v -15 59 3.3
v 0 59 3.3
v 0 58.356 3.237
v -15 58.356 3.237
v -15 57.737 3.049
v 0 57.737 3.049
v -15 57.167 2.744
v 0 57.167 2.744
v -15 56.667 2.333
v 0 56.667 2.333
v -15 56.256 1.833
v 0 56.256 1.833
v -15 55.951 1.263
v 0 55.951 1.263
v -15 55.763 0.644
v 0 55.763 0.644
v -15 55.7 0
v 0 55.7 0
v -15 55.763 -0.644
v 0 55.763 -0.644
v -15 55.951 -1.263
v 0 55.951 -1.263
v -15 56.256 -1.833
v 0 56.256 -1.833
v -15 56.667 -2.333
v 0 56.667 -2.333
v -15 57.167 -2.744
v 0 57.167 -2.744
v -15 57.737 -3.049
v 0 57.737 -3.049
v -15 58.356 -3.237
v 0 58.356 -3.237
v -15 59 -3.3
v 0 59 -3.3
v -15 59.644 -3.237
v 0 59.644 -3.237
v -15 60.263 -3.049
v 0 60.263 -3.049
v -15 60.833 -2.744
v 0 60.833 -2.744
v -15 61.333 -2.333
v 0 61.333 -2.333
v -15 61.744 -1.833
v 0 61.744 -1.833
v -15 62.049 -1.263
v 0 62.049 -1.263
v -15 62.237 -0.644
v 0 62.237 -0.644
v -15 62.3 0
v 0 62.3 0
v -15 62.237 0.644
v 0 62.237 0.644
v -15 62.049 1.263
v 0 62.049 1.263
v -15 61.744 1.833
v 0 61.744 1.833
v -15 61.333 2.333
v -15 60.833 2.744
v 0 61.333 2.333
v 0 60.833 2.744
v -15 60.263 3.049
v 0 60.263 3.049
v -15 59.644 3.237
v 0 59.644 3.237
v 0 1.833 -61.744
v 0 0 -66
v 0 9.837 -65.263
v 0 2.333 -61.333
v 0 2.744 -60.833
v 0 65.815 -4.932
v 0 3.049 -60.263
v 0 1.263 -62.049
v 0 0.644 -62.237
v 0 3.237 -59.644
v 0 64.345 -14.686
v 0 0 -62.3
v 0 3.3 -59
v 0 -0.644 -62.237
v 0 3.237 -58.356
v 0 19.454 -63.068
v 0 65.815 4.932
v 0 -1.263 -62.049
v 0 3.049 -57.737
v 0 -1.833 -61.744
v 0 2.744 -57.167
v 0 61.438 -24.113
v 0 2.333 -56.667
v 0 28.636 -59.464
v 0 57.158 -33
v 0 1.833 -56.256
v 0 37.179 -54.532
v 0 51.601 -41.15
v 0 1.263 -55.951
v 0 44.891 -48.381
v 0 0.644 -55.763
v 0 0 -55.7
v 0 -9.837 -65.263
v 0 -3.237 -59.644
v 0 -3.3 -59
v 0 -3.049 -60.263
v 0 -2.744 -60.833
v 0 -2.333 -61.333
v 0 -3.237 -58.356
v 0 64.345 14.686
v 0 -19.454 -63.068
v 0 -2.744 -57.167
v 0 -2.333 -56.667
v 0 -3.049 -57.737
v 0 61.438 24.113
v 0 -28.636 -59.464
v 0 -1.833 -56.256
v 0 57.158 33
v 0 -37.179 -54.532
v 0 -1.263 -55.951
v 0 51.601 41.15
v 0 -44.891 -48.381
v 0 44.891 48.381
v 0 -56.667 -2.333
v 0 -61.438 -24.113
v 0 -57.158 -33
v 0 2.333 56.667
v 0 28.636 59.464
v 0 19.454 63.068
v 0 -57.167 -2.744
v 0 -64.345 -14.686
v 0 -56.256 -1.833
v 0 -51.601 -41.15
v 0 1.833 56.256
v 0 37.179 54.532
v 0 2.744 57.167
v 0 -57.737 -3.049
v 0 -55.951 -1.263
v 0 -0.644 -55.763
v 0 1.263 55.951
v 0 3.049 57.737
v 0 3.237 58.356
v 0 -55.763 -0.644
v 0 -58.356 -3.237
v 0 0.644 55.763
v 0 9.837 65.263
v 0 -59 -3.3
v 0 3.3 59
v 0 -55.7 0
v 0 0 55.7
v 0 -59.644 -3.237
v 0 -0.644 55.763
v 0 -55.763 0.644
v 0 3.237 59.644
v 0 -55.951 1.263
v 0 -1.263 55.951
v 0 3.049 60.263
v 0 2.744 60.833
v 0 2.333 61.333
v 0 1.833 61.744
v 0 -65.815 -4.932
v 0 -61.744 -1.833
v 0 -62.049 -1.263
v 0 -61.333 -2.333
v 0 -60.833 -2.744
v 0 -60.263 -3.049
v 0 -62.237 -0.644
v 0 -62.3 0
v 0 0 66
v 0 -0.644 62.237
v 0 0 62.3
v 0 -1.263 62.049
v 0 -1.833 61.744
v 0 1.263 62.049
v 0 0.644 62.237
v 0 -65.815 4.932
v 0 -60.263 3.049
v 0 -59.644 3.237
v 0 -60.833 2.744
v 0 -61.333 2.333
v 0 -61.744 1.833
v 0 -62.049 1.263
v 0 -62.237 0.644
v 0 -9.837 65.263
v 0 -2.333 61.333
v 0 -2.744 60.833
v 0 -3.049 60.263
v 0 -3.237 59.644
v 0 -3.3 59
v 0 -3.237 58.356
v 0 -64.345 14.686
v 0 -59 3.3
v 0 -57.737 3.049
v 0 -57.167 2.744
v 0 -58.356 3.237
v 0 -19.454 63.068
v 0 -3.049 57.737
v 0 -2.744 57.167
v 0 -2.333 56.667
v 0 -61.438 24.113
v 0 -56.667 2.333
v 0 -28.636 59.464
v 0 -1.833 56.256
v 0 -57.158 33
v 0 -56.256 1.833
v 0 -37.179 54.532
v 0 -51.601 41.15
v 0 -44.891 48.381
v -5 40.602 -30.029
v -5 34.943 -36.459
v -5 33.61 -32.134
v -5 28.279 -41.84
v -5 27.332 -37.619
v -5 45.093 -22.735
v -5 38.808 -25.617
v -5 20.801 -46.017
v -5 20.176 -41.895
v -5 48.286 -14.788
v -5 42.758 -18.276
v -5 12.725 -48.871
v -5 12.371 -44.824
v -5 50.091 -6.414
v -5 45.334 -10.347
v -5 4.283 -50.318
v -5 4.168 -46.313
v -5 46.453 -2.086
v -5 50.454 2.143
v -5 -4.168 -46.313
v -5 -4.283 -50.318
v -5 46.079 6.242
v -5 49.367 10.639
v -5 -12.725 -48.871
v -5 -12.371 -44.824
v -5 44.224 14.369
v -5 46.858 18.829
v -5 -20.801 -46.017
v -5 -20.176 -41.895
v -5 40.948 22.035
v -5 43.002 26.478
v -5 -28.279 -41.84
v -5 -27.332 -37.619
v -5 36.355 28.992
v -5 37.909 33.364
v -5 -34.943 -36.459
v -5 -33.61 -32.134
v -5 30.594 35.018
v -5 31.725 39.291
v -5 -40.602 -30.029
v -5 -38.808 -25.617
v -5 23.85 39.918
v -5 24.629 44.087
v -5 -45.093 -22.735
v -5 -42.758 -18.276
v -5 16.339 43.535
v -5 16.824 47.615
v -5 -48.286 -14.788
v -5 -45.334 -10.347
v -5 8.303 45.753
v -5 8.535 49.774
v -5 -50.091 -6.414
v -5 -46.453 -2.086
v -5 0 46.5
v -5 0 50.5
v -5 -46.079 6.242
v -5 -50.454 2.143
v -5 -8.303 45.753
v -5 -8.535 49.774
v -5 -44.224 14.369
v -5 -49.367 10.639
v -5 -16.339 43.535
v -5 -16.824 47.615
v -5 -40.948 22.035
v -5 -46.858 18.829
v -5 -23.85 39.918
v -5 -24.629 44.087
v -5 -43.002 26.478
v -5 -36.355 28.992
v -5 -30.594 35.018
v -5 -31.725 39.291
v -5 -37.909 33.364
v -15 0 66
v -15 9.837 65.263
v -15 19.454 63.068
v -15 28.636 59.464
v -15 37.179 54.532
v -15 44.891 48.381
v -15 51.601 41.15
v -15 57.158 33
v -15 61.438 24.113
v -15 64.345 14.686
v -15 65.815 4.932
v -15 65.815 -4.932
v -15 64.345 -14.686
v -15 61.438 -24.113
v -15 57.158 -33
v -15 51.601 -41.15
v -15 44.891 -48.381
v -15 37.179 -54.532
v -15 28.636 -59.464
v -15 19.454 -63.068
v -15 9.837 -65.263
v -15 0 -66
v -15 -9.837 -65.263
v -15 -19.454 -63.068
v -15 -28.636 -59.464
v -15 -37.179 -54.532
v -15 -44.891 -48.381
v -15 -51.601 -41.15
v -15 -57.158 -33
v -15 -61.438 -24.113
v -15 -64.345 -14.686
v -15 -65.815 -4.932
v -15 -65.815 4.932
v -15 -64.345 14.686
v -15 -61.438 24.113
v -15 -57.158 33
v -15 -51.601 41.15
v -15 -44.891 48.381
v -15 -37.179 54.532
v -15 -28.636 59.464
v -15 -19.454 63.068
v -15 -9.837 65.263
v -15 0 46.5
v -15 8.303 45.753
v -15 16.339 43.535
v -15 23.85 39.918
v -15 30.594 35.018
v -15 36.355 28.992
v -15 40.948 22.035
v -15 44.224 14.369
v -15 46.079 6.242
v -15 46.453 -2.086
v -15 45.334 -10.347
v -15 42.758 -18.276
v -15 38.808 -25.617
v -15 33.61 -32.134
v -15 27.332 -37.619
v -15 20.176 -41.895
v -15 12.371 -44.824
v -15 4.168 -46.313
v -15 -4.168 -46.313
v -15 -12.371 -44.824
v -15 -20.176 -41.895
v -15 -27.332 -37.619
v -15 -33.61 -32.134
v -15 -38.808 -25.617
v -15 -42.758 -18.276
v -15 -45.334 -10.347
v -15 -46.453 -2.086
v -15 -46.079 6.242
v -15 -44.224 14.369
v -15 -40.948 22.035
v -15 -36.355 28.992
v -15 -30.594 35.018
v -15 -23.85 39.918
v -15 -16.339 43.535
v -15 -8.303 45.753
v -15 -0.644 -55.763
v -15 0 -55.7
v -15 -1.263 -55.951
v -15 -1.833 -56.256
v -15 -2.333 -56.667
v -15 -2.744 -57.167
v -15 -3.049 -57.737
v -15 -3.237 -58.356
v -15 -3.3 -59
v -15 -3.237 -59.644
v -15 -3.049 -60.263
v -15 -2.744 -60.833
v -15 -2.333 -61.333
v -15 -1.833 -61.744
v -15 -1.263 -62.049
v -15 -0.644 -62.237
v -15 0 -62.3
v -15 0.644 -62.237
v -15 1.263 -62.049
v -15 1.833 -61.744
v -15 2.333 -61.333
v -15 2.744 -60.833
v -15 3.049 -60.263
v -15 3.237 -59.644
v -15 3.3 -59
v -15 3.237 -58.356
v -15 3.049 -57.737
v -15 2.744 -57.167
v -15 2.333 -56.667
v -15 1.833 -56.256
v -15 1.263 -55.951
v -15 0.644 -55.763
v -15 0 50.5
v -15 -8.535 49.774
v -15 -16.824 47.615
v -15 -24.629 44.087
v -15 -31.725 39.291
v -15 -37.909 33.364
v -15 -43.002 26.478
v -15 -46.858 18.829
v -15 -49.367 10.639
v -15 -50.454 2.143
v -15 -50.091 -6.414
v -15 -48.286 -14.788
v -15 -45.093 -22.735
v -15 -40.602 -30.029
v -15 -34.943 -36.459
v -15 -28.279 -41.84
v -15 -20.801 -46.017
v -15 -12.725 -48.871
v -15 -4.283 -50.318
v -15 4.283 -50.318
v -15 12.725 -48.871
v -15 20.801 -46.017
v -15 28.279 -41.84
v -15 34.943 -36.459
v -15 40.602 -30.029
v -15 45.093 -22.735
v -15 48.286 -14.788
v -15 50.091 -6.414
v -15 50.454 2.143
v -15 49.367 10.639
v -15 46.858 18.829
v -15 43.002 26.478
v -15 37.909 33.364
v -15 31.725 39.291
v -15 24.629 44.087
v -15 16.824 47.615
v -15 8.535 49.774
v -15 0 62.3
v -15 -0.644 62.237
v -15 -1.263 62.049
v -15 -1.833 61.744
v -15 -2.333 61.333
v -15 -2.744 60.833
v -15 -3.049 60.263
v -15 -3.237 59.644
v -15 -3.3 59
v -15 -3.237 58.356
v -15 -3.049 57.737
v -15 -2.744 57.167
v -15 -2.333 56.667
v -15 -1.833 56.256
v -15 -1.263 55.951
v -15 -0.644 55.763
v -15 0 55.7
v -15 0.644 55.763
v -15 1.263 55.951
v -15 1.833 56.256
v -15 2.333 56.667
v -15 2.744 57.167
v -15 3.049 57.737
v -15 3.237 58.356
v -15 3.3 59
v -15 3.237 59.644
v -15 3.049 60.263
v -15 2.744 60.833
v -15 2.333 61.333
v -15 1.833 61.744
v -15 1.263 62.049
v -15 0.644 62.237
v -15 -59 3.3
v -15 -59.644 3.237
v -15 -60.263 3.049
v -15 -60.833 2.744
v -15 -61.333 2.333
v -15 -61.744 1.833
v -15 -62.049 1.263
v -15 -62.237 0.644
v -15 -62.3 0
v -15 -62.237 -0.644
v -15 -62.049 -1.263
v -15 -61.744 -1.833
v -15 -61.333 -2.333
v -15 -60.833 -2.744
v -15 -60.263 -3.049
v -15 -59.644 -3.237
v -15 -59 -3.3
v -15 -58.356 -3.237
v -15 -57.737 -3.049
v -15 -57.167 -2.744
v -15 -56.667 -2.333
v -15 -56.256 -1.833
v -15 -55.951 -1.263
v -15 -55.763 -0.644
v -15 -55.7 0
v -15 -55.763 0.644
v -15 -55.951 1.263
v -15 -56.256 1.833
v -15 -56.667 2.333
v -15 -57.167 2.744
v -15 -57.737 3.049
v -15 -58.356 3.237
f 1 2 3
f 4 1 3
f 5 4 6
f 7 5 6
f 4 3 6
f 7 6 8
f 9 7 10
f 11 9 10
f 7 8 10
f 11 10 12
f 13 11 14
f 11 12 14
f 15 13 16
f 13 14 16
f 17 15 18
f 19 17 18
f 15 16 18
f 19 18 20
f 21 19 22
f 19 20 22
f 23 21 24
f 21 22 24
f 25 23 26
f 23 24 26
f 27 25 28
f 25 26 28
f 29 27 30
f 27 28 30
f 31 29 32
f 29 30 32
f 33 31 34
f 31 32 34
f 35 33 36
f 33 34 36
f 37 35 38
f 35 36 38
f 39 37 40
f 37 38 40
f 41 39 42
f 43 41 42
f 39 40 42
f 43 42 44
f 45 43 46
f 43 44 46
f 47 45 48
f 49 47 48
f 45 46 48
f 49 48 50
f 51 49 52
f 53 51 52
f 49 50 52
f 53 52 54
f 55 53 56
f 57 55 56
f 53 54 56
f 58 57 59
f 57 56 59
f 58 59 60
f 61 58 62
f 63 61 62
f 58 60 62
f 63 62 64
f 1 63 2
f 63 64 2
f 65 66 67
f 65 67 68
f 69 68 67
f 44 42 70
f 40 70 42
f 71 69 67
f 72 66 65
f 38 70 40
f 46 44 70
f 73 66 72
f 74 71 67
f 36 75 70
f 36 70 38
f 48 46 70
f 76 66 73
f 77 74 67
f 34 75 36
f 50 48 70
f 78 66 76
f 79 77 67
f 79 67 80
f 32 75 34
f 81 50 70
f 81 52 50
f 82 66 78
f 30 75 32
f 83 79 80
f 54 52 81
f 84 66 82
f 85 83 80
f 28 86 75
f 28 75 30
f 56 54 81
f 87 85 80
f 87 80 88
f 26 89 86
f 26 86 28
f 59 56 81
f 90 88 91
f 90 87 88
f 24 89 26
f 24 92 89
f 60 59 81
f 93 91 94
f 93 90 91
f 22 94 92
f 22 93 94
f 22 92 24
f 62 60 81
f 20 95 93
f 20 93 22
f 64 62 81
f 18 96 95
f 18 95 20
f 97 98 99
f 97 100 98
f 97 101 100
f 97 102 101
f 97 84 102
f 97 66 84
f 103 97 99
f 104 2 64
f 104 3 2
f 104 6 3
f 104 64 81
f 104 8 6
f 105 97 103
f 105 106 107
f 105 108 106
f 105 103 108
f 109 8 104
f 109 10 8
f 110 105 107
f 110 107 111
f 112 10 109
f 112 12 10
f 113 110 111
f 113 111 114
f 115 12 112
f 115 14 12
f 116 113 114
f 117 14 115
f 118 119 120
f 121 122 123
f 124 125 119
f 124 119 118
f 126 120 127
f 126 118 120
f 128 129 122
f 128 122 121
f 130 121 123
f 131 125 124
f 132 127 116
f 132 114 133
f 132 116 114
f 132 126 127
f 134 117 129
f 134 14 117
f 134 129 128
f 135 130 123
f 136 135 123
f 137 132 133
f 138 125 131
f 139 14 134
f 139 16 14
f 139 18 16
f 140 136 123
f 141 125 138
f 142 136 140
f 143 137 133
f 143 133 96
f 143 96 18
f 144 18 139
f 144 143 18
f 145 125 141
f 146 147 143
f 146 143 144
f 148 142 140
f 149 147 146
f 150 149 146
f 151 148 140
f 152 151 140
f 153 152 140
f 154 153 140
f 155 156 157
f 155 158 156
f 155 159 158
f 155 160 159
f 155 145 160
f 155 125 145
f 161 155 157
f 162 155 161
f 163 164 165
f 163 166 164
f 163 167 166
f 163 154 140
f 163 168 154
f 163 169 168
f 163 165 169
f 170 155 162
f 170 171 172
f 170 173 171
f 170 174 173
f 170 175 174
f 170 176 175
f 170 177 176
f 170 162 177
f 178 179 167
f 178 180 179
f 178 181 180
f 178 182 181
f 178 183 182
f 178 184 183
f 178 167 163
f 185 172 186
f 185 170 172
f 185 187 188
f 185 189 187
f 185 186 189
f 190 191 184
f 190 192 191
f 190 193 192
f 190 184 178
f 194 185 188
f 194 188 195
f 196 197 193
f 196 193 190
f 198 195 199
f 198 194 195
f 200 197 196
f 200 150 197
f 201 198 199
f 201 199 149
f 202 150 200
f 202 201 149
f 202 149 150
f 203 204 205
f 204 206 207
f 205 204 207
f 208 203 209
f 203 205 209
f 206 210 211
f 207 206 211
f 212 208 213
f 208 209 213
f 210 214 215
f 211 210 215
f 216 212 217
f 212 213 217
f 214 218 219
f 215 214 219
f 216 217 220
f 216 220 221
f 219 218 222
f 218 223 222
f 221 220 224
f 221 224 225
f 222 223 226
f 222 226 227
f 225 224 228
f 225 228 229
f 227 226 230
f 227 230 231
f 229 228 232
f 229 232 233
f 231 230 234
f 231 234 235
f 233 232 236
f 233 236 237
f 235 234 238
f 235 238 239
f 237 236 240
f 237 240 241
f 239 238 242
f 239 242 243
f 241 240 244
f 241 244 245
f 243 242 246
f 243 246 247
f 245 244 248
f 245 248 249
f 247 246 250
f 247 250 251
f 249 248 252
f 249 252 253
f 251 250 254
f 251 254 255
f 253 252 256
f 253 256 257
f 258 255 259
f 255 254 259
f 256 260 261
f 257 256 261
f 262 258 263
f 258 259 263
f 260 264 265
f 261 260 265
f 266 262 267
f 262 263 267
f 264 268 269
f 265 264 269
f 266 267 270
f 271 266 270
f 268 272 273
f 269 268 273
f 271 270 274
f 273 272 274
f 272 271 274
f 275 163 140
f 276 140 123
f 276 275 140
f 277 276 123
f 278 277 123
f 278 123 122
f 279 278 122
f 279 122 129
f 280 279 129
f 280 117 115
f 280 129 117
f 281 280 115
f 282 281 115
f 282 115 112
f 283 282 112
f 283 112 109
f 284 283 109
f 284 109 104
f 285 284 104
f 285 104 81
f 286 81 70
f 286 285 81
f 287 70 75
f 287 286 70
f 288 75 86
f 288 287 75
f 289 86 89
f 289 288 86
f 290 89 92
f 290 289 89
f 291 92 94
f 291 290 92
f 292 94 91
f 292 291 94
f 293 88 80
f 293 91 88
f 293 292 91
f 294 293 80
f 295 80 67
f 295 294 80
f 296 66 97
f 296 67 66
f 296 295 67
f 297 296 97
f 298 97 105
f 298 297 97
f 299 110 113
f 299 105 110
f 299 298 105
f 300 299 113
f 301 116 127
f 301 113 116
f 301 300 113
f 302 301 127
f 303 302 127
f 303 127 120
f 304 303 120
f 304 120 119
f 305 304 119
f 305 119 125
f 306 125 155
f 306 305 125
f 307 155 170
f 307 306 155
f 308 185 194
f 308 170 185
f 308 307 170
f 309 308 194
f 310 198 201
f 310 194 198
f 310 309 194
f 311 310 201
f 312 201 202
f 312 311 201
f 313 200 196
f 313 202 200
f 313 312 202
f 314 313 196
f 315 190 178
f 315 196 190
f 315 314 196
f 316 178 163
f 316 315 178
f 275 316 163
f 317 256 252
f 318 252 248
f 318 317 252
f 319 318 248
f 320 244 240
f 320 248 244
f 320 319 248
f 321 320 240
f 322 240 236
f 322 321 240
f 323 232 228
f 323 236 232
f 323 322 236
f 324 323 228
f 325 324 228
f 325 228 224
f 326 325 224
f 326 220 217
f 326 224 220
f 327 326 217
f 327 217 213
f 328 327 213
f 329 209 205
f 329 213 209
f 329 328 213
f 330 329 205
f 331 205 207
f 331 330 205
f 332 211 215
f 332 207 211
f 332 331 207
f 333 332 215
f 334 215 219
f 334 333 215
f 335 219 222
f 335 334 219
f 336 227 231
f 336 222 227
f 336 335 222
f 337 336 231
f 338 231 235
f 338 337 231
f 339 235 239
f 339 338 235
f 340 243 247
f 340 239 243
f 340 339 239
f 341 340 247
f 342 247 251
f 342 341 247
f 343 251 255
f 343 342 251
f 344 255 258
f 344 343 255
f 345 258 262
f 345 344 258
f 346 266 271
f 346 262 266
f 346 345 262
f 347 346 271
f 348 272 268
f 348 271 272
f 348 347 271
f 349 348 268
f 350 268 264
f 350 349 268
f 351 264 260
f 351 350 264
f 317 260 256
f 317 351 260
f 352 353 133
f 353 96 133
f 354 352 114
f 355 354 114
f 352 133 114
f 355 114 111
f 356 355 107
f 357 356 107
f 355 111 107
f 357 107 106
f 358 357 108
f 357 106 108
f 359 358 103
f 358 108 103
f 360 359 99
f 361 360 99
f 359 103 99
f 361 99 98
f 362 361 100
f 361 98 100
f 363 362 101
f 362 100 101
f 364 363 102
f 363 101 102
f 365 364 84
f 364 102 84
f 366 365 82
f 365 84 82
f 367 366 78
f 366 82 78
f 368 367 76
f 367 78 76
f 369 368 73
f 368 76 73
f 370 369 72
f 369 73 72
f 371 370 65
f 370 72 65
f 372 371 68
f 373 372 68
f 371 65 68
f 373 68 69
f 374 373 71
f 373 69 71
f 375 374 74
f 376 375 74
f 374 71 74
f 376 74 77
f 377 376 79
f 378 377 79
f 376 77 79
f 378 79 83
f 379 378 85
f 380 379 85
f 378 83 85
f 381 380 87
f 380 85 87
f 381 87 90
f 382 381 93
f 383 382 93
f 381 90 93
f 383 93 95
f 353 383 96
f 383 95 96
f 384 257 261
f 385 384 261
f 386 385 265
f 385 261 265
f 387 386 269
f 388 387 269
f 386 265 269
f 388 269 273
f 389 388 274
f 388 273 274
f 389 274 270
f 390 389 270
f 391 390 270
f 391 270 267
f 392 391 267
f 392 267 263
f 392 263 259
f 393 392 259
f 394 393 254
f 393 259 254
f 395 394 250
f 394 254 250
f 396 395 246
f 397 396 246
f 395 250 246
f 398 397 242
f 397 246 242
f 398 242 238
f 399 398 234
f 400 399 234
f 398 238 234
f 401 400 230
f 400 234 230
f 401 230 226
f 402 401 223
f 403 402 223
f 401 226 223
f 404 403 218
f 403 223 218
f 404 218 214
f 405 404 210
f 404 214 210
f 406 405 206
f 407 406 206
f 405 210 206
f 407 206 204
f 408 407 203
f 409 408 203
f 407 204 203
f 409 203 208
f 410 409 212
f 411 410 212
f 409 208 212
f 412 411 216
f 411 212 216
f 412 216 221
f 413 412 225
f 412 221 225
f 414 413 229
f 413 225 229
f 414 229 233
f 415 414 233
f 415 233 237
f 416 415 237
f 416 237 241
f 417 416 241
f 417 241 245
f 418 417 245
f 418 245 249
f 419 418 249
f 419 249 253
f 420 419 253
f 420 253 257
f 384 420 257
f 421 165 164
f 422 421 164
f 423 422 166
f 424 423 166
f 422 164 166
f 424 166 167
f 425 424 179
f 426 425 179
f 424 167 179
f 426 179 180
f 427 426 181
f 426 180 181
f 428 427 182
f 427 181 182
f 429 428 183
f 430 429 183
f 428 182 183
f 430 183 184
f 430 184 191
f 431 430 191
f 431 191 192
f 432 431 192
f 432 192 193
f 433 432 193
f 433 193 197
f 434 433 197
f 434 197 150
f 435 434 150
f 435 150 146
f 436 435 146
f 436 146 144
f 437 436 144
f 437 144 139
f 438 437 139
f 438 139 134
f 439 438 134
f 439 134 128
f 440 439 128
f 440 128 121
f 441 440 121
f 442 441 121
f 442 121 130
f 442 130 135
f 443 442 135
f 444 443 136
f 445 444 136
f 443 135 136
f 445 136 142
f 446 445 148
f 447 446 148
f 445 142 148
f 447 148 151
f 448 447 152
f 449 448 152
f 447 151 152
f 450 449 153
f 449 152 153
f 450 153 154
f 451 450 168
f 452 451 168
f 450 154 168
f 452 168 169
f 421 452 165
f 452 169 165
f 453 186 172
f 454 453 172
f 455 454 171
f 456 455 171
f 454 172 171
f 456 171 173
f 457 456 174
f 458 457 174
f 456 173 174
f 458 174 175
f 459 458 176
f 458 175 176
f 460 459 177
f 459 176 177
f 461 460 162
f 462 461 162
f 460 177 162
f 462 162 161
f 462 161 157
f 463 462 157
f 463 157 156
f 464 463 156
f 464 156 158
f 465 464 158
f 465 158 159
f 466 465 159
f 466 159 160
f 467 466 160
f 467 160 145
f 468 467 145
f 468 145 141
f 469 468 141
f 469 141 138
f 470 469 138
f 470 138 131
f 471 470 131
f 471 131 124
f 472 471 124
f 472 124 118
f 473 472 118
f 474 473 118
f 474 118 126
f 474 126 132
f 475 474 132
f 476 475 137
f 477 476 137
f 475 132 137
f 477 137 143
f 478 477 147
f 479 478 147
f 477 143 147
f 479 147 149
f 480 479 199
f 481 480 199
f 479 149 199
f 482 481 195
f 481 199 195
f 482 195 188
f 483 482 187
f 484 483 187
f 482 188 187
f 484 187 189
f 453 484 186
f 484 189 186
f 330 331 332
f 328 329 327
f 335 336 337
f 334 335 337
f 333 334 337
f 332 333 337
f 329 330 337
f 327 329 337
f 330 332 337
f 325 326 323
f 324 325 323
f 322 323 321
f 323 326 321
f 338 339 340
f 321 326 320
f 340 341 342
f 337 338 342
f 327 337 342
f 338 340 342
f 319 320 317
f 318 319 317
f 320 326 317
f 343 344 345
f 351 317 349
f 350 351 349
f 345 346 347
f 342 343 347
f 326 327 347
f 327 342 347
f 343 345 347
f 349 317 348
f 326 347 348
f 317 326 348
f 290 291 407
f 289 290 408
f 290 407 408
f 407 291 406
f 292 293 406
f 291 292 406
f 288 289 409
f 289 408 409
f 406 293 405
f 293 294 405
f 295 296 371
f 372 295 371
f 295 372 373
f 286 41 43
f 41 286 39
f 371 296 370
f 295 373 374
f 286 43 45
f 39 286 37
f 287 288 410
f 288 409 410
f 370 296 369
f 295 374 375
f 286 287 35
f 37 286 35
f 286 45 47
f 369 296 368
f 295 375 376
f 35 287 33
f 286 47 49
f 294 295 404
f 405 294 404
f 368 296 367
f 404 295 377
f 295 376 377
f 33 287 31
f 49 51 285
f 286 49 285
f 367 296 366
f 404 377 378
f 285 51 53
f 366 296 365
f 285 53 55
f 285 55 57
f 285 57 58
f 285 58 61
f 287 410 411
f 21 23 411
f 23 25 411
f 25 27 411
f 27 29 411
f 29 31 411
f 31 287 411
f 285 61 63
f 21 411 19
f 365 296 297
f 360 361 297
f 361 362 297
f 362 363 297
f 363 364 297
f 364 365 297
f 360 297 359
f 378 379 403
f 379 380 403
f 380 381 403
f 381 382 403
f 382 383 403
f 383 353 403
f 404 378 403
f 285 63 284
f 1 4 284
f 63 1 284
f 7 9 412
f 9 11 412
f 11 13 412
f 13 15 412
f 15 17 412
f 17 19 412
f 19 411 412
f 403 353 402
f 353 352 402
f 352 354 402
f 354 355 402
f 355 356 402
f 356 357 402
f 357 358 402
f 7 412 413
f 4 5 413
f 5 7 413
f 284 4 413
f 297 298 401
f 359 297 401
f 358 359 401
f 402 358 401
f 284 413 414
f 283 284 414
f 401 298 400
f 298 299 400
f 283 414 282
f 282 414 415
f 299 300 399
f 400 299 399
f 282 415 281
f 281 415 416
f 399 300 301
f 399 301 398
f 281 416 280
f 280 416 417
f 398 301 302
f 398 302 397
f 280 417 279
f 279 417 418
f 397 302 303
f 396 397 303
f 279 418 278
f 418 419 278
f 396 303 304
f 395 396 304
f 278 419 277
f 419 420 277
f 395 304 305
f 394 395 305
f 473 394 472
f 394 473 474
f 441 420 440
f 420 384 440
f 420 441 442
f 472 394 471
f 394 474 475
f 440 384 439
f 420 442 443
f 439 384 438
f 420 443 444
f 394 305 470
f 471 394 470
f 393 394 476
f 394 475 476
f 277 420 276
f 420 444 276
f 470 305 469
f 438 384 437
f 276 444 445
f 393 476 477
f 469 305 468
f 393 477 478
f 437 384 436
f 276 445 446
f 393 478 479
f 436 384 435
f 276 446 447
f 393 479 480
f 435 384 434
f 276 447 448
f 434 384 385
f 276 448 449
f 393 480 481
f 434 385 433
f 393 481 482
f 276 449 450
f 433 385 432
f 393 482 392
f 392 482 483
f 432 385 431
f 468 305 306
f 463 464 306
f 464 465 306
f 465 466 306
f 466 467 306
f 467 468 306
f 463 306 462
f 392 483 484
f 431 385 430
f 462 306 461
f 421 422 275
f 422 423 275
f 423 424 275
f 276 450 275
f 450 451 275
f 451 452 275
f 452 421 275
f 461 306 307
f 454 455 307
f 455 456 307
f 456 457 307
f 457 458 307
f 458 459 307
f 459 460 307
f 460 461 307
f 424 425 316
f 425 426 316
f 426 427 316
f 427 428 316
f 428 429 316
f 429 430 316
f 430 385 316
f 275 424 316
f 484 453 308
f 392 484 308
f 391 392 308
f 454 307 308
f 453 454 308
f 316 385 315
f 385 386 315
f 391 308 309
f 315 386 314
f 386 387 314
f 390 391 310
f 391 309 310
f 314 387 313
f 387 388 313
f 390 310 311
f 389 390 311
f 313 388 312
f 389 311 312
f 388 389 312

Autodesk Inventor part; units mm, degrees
ref_plane "YZ Plane" through (0, 0, 0) normal (1, 0, 0) x (0, 1, 0)
ref_plane "XZ Plane" through (0, 0, 0) normal (0, 1, 0) x (-1, 0, 0)
ref_plane "XY Plane" through (0, 0, 0) normal (0, 0, 1) x (1, 0, 0)
sketch "Sketch4" plane through (0, 0, 0) normal (0, 1, 0) x (-1, 0, 0)
  line L0 (0, 0) -> (0, 66)
  line L1 (0, 66) -> (15, 66)
  line L2 (15, 66) -> (15, 50.5)
  line L3 (15, 50.5) -> (5, 50.5)
  line L4 (5, 50.5) -> (5, 46.5)
  line L5 (5, 46.5) -> (15, 46.5)
  line L6 (15, 46.5) -> (15, 0)
  line L7 (15, 0) -> (0, 0)
  dimension "d6" = 66
  dimension "d7" = 15
  dimension "d8" = 15.5
  dimension "d9" = 10
  dimension "d10" = 4
revolve "Revolution1" add sketch "Sketch4" angle 360 about axis through (-15, 0, 0) along (1, 0, 0)
sketch "Sketch5" plane through (-15, 0, 0) normal (-1, 0, 0) x (0, 0, 1)
  point P0 (0, 0)
sketch "Sketch6" plane through (-15, 0, 0) normal (-1, 0, 0) x (0, 0, 1)
  circle A0 centre (0, 0) radius 59
  point P0 (59, 0)
  point P1 (0, -59)
  point P2 (-59, 0)
  point P3 (0, 59)
  dimension "d13" = 118
hole "Hole1" at (-15, 0, 59) at (-15, -59, 0) at (-15, 0, -59) at (-15, 59, 0) direction (1, 0, 0) diameter 6.6 end through all clearance for "Flat Head Machine Screw" size "M6" standard "Ansi Metric M Profile"
properties part number "100mm-FlangeBottom-Sketch"
